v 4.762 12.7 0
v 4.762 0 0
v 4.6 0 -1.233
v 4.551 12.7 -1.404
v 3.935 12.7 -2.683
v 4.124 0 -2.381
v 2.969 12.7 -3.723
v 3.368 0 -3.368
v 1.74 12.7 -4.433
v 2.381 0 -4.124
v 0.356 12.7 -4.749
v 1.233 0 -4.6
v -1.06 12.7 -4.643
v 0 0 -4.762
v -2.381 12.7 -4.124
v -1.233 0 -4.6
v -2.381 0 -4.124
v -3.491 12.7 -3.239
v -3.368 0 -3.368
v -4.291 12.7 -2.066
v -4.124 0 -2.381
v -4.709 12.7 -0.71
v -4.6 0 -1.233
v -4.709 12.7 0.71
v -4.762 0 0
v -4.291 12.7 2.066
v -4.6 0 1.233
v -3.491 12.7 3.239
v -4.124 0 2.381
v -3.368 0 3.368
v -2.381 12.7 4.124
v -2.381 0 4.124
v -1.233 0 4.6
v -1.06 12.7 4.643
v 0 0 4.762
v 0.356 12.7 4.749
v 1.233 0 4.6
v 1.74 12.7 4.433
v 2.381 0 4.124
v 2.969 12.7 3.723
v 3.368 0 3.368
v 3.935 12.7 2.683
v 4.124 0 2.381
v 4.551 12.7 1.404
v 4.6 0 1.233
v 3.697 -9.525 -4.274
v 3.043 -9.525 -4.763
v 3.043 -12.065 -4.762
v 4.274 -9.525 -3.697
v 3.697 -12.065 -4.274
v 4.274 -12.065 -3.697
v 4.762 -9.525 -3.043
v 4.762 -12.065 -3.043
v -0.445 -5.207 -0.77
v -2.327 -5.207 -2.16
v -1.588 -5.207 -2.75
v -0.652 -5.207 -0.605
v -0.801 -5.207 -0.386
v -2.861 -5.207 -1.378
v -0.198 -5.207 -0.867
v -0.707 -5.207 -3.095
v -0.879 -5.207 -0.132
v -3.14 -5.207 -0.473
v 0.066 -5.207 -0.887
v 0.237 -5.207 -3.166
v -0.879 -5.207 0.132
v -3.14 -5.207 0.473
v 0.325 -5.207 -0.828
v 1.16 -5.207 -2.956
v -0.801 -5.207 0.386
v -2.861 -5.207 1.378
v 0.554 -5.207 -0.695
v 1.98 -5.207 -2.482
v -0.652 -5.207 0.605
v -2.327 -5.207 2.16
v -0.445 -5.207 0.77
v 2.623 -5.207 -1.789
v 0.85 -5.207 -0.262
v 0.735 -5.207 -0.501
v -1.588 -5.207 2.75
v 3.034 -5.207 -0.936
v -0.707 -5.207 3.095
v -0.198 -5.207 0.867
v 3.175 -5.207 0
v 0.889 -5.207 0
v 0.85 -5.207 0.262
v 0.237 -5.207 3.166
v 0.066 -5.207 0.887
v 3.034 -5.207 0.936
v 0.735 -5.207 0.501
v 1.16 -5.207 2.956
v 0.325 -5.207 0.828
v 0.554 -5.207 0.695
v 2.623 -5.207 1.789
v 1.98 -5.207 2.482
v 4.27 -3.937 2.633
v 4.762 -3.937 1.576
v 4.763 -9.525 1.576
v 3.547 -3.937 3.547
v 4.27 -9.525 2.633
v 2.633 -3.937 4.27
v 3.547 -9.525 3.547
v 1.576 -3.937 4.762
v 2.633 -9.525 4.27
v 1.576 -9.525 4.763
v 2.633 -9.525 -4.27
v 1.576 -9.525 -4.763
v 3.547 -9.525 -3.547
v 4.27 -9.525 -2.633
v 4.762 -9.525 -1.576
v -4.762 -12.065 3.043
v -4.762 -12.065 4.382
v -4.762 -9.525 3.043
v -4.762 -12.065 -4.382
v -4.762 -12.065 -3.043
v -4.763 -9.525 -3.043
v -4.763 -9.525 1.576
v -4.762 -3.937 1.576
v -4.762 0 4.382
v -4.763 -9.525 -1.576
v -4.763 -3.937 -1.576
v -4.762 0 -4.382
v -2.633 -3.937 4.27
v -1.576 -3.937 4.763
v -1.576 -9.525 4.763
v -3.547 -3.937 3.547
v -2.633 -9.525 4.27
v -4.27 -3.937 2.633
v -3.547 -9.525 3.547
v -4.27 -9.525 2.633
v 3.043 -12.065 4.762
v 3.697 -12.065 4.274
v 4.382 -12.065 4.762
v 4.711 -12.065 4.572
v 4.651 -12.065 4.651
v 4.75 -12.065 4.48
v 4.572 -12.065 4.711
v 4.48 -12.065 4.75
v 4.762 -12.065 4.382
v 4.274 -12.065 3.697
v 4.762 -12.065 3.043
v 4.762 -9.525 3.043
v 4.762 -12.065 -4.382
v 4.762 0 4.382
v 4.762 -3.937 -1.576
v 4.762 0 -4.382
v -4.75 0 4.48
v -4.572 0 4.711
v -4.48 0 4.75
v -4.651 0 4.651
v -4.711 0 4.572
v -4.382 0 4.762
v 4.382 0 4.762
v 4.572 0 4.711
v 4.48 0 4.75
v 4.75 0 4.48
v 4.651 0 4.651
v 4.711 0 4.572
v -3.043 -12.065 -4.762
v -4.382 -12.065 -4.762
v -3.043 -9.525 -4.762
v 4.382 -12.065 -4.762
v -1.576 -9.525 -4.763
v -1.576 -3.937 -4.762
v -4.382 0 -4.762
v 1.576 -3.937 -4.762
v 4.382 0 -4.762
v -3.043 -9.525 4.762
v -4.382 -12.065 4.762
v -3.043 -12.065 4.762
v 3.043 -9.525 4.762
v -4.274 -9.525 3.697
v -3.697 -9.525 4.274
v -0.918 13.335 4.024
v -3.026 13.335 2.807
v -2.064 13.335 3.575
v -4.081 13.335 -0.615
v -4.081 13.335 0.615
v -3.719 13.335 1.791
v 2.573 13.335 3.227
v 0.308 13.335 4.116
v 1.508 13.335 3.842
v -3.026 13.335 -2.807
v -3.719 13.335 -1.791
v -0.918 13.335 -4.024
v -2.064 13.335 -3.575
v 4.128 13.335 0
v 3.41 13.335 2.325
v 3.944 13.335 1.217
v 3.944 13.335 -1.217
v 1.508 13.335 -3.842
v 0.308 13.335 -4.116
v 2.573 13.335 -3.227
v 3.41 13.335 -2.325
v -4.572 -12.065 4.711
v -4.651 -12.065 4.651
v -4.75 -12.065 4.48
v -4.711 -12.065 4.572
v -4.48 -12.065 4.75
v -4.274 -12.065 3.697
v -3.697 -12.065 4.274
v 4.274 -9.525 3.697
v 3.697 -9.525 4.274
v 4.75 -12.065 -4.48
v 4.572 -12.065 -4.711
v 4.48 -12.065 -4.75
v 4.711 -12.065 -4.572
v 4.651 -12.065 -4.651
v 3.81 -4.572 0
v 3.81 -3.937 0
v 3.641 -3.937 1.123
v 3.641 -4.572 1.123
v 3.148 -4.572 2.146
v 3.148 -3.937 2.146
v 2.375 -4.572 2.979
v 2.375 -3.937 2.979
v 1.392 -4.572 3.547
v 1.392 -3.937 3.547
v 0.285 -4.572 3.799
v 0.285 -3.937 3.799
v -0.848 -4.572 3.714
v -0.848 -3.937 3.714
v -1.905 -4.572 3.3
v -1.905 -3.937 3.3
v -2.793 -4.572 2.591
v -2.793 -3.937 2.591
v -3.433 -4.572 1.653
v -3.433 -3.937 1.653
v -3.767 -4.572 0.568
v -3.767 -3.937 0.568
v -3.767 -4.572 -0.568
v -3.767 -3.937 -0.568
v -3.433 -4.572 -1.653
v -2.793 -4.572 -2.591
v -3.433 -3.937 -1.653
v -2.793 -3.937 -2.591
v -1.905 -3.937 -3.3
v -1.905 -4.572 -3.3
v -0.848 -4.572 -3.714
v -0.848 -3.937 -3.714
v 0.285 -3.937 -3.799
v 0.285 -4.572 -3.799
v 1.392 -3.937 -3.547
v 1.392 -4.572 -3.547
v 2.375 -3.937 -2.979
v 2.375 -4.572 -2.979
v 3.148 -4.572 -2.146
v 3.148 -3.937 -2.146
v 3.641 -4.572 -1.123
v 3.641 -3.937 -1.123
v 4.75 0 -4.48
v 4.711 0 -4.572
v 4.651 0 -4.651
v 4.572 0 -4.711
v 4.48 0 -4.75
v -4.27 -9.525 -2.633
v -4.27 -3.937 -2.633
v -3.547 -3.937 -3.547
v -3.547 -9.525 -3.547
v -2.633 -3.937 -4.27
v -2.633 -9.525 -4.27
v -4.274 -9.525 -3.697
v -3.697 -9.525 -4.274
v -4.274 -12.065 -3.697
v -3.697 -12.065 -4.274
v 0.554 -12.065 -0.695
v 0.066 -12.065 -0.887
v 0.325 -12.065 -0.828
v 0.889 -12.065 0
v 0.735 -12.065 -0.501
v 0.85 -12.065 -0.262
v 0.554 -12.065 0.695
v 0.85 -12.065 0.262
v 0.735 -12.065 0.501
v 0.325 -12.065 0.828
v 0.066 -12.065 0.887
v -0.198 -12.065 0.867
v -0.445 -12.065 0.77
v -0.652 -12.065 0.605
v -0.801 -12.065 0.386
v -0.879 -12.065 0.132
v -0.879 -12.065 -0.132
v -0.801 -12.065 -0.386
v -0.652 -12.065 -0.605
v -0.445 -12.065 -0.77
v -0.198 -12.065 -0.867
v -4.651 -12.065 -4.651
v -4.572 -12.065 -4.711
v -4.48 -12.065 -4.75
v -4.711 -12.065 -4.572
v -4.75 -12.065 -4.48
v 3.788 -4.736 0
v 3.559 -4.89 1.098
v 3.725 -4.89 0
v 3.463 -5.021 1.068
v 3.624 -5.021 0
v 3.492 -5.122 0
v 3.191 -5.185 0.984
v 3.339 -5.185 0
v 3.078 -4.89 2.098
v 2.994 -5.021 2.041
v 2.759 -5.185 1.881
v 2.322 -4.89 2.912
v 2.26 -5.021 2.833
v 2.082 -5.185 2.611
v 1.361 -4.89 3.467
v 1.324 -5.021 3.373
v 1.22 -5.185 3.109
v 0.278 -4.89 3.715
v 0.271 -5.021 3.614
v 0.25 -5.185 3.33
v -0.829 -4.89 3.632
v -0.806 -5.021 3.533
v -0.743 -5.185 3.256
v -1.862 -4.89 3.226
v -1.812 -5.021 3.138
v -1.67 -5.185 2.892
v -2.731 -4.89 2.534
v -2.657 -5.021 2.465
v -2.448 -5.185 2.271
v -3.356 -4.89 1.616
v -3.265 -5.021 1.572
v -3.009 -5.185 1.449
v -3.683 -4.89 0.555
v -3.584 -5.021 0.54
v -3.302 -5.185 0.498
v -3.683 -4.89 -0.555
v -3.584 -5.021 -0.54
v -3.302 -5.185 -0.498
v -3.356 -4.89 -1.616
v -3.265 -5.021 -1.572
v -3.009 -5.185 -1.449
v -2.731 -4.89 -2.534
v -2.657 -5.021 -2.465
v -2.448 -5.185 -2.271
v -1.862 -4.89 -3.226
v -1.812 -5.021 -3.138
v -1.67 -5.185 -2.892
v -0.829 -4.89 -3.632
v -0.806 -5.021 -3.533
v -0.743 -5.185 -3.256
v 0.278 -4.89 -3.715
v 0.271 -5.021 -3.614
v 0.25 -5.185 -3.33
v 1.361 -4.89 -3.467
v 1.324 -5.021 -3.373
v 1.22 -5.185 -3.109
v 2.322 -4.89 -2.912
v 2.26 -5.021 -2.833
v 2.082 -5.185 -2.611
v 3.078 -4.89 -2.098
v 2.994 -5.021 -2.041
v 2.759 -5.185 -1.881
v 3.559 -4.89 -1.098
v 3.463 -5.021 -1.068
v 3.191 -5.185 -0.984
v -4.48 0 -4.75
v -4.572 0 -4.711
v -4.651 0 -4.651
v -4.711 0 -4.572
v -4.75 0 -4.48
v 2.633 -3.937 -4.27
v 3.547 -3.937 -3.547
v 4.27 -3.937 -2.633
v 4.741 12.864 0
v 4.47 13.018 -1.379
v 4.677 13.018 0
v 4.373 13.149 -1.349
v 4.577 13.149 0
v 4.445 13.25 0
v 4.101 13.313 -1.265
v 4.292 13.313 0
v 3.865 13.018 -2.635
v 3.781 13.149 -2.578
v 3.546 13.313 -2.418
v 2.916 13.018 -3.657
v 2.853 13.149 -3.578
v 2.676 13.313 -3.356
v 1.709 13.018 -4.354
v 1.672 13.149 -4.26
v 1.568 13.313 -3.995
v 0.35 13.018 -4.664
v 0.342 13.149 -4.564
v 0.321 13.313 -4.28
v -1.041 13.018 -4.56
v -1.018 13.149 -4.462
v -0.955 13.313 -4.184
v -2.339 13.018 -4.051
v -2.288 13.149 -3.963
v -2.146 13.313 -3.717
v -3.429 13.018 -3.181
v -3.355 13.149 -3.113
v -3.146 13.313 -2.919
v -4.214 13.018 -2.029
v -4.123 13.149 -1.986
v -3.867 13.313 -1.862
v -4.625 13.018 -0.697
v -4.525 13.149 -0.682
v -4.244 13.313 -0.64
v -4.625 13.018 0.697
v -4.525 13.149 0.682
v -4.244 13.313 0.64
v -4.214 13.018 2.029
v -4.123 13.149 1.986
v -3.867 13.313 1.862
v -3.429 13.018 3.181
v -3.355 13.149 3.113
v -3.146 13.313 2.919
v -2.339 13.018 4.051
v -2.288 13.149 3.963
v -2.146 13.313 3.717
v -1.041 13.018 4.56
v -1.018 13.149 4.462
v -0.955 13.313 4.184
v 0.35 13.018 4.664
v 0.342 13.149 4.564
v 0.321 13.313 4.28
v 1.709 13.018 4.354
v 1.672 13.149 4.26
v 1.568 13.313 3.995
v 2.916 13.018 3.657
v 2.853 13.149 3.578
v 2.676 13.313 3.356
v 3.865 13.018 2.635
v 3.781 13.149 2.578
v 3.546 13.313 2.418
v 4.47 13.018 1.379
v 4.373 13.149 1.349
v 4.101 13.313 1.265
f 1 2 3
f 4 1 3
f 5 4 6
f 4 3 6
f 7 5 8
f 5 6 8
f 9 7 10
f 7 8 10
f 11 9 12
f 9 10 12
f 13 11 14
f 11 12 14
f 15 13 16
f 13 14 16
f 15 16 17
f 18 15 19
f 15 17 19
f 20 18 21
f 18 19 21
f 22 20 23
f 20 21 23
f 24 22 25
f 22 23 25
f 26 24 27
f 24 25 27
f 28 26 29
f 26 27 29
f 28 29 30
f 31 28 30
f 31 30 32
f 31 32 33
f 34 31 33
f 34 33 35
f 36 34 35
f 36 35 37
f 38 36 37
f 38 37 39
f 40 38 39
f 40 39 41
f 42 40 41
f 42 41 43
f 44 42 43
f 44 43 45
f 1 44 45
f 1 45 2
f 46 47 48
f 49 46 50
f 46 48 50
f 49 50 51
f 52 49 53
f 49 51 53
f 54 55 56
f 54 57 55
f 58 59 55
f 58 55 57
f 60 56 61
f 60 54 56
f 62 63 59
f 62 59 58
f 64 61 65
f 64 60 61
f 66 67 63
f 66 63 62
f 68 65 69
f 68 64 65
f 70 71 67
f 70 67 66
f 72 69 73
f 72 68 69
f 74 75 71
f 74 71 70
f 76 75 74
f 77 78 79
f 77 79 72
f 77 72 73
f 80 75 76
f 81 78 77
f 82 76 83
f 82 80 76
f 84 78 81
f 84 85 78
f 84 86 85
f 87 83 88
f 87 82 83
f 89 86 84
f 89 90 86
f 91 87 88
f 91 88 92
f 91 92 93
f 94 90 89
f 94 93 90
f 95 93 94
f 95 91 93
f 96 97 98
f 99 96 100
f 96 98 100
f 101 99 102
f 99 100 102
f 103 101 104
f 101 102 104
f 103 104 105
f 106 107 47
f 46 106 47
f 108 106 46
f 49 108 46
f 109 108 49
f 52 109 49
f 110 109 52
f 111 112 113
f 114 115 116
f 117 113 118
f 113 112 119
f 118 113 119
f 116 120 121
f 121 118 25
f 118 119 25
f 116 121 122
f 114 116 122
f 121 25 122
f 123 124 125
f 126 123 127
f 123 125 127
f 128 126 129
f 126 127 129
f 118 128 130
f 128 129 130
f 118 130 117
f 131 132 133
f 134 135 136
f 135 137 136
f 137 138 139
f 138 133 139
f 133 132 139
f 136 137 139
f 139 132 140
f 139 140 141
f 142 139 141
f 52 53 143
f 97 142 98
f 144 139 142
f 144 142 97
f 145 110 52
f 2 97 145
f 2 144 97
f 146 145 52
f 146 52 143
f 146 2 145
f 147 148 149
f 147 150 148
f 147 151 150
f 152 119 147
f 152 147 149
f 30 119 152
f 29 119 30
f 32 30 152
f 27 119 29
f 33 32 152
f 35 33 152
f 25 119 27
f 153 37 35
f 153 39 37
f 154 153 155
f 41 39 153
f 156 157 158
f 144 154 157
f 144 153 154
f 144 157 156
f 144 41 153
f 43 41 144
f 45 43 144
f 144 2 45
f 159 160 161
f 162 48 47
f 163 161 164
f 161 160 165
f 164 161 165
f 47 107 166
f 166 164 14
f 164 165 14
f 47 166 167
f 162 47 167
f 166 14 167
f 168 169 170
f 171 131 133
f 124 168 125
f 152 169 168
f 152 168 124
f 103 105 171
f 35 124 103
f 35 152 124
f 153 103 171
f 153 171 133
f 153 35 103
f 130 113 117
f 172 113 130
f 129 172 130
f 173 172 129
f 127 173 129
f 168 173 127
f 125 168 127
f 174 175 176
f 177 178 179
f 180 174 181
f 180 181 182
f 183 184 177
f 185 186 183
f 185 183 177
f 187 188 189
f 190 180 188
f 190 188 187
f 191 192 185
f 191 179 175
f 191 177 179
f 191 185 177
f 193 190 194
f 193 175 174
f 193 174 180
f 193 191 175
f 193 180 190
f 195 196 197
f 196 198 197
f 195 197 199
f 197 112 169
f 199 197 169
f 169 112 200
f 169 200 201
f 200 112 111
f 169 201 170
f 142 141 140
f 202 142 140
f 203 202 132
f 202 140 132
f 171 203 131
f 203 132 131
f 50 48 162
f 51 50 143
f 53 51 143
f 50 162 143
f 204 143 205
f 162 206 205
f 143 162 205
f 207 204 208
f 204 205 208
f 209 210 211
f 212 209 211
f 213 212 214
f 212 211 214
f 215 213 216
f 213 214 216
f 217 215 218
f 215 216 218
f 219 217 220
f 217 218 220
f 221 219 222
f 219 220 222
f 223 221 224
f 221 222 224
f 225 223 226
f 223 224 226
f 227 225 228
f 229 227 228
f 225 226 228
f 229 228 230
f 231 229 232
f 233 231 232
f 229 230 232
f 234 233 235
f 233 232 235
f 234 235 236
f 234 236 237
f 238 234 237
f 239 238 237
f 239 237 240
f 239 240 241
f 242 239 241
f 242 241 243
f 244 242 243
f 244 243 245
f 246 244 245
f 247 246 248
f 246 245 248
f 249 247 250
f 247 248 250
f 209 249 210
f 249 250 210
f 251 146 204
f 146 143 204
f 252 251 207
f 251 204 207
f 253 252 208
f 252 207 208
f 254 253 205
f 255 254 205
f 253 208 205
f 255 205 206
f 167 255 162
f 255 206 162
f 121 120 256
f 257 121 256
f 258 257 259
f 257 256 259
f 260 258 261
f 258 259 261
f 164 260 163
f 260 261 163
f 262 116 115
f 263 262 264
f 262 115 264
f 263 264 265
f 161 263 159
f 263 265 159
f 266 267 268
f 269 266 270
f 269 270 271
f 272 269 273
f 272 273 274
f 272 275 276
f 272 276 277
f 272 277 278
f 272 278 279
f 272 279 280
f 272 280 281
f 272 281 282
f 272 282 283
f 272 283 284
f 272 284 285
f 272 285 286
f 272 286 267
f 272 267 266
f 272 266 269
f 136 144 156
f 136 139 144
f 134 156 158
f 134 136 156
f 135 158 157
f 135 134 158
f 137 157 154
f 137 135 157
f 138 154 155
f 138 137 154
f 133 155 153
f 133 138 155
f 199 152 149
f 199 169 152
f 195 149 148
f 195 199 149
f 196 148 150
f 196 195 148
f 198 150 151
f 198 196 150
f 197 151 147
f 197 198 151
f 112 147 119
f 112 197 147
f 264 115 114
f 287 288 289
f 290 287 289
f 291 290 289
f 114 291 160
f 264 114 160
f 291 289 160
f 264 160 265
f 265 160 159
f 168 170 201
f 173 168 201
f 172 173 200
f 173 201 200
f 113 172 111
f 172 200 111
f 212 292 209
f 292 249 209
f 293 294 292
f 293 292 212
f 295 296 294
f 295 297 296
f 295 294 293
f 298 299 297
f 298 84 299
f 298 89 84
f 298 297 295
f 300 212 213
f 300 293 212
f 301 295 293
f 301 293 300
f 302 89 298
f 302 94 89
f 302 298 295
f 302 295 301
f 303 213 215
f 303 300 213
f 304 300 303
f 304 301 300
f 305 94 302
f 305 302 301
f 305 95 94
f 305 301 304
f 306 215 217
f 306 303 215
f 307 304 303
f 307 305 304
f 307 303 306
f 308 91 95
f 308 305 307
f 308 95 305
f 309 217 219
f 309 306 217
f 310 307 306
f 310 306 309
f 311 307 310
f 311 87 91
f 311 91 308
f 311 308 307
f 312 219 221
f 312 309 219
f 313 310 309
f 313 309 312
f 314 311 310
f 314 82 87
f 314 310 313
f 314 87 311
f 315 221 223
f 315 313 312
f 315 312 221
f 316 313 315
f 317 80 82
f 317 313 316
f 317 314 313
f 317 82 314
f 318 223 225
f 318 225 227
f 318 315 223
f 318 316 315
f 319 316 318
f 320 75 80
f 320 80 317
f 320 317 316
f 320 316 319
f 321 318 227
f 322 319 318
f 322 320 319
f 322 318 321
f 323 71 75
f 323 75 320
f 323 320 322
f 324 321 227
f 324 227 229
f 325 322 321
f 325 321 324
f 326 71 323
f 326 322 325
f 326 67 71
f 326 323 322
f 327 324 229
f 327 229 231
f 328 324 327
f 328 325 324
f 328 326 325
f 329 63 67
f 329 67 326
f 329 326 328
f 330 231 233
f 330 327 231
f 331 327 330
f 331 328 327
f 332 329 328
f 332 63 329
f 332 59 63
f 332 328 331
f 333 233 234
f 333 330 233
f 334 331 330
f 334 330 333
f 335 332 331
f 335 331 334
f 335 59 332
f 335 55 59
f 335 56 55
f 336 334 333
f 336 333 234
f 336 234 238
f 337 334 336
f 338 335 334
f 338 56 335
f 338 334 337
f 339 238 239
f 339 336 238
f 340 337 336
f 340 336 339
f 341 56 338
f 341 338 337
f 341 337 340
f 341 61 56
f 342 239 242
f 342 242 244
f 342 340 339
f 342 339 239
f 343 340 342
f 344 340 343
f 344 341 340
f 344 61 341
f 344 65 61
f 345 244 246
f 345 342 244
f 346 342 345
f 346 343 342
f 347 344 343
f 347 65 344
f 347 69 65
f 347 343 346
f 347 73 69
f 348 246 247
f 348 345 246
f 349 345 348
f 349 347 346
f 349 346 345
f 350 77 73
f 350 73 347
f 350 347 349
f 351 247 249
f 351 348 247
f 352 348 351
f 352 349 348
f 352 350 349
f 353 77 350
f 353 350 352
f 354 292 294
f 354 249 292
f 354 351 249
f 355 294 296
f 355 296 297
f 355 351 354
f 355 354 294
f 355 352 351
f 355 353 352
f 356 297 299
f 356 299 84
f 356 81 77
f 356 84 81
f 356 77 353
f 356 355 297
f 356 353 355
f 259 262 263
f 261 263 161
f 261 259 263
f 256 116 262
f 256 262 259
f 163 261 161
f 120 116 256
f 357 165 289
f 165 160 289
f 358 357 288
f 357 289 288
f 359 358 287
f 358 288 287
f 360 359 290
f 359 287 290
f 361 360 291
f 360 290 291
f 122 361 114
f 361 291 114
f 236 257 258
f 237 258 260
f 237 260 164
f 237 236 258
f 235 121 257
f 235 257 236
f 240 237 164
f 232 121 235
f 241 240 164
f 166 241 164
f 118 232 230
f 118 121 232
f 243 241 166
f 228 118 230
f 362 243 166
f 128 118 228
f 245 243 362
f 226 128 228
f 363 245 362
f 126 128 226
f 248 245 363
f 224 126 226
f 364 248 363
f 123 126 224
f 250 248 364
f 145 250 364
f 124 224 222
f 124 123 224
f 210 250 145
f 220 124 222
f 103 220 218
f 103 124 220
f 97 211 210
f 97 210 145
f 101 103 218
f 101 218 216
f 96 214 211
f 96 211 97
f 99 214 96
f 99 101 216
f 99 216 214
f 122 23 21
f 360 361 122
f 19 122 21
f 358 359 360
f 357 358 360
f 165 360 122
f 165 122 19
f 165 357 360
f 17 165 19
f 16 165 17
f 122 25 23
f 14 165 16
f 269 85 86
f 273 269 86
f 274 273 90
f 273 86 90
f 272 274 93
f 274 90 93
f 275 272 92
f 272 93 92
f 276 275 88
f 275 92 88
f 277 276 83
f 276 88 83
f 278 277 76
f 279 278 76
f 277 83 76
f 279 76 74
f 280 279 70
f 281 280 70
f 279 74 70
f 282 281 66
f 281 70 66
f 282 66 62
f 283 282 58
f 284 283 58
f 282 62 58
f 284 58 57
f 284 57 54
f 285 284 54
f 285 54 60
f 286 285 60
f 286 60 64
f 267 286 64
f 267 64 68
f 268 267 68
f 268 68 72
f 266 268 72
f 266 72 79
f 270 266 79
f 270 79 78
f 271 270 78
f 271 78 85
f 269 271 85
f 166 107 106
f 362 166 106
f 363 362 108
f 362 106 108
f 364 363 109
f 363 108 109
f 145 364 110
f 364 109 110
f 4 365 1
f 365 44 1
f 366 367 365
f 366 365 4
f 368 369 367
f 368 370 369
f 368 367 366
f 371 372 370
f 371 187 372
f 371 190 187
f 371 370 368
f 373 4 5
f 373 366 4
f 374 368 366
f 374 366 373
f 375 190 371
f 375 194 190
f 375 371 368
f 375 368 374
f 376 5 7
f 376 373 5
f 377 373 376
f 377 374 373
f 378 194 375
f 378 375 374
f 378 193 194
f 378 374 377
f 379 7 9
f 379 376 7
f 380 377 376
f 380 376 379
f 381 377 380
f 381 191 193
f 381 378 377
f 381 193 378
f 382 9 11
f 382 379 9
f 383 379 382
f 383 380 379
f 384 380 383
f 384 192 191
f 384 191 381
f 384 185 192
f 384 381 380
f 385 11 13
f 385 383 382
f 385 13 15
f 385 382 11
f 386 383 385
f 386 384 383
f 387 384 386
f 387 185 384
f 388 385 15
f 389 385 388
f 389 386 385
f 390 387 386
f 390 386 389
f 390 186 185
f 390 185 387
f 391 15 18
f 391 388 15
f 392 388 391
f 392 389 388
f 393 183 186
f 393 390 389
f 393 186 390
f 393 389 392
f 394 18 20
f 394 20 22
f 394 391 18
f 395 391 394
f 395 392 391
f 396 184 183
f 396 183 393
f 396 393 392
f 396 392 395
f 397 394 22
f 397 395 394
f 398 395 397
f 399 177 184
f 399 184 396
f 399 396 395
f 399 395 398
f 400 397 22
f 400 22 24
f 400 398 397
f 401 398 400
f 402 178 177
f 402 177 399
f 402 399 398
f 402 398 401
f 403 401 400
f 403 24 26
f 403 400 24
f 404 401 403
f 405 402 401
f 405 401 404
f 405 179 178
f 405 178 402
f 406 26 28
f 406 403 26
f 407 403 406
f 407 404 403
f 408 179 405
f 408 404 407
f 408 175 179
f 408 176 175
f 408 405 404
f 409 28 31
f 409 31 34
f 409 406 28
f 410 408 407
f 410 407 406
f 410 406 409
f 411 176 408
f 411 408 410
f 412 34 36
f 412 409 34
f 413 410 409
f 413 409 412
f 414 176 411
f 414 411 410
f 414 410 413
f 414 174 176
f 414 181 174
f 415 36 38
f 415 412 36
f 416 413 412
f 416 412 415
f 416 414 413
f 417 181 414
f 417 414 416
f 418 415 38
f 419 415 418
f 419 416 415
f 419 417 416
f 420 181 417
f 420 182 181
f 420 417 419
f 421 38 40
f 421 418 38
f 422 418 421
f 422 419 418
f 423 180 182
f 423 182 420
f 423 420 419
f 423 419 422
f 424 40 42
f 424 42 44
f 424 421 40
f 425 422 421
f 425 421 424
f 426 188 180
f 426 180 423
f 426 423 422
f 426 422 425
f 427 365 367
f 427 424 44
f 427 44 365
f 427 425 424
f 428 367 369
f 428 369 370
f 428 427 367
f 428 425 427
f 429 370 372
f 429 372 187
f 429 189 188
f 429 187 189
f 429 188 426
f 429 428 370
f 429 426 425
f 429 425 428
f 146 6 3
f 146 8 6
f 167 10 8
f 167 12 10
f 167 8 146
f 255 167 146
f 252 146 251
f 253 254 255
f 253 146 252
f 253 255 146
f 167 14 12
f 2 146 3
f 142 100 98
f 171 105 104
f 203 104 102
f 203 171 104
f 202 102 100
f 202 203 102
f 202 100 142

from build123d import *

# Parameters (mm, degrees)
SKETCH1_W           = 9.525
SKETCH1_H           = 9.525
BOSS_EXTRUDE1_DEPTH = 12.065
SKETCH2_R           = 4.7625
BOSS_EXTRUDE2_DEPTH = 13.335
FILLET1_R           = 0.635
SKETCH3_R           = 5.6515
CUT_EXTRUDE1_DEPTH  = 2.54
SKETCH4_R           = 5.0165
CUT_EXTRUDE2_DEPTH  = 5.588
SKETCH5_R           = 3.81
BOSS_EXTRUDE3_DEPTH = 1.27
FILLET2_R           = 0.635
SKETCH6_R           = 0.889
BOSS_EXTRUDE4_DEPTH = 8.128
FILLET4_R           = 0.381


with BuildPart() as part:
    # Sketch1 → Boss-Extrude1 (new body)
    with BuildSketch(Plane(origin=(0, 0, 0), x_dir=(1, 0, 0), z_dir=(0, 1, 0))):
        Rectangle(SKETCH1_W, SKETCH1_H)
    extrude(amount=-BOSS_EXTRUDE1_DEPTH)

    # Sketch2 → Boss-Extrude2 (add)
    with BuildSketch(Plane(origin=(0, 0, 0), x_dir=(1, 0, 0), z_dir=(0, 1, 0))):
        Circle(SKETCH2_R)
    extrude(amount=BOSS_EXTRUDE2_DEPTH)

    # Fillet1
    fillet1_edges = [part.edges().sort_by_distance(p)[0] for p in [
        (-4.7625, 13.335, 0),
    ]]
    fillet(fillet1_edges, radius=FILLET1_R)

    # Sketch3 → Cut-Extrude1 (cut)
    with BuildSketch(Plane.XZ.offset(12.065)):
        Circle(SKETCH3_R)
    extrude(amount=-CUT_EXTRUDE1_DEPTH, mode=Mode.SUBTRACT)

    # Sketch4 → Cut-Extrude2 (cut)
    with BuildSketch(Plane.XZ.offset(9.525)):
        Circle(SKETCH4_R)
    extrude(amount=-CUT_EXTRUDE2_DEPTH, mode=Mode.SUBTRACT)

    # Sketch5 → Boss-Extrude3 (add)
    with BuildSketch(Plane.XZ.offset(3.937)):
        Circle(SKETCH5_R)
    extrude(amount=BOSS_EXTRUDE3_DEPTH)

    # Fillet2
    fillet2_edges = [part.edges().sort_by_distance(p)[0] for p in [
        (-3.81, -5.207, 0),
    ]]
    fillet(fillet2_edges, radius=FILLET2_R)

    # Sketch6 → Boss-Extrude4 (add)
    with BuildSketch(Plane.XZ.offset(3.937)):
        Circle(SKETCH6_R)
    extrude(amount=BOSS_EXTRUDE4_DEPTH)

    # Fillet4
    fillet4_edges = [part.edges().sort_by_distance(p)[0] for p in [
        (4.7625, -6.0325, 4.7625),
        (-4.7625, -6.0325, 4.7625),
        (-4.7625, -6.0325, -4.7625),
        (4.7625, -6.0325, -4.7625),
    ]]
    fillet(fillet4_edges, radius=FILLET4_R)


solid = part.part
